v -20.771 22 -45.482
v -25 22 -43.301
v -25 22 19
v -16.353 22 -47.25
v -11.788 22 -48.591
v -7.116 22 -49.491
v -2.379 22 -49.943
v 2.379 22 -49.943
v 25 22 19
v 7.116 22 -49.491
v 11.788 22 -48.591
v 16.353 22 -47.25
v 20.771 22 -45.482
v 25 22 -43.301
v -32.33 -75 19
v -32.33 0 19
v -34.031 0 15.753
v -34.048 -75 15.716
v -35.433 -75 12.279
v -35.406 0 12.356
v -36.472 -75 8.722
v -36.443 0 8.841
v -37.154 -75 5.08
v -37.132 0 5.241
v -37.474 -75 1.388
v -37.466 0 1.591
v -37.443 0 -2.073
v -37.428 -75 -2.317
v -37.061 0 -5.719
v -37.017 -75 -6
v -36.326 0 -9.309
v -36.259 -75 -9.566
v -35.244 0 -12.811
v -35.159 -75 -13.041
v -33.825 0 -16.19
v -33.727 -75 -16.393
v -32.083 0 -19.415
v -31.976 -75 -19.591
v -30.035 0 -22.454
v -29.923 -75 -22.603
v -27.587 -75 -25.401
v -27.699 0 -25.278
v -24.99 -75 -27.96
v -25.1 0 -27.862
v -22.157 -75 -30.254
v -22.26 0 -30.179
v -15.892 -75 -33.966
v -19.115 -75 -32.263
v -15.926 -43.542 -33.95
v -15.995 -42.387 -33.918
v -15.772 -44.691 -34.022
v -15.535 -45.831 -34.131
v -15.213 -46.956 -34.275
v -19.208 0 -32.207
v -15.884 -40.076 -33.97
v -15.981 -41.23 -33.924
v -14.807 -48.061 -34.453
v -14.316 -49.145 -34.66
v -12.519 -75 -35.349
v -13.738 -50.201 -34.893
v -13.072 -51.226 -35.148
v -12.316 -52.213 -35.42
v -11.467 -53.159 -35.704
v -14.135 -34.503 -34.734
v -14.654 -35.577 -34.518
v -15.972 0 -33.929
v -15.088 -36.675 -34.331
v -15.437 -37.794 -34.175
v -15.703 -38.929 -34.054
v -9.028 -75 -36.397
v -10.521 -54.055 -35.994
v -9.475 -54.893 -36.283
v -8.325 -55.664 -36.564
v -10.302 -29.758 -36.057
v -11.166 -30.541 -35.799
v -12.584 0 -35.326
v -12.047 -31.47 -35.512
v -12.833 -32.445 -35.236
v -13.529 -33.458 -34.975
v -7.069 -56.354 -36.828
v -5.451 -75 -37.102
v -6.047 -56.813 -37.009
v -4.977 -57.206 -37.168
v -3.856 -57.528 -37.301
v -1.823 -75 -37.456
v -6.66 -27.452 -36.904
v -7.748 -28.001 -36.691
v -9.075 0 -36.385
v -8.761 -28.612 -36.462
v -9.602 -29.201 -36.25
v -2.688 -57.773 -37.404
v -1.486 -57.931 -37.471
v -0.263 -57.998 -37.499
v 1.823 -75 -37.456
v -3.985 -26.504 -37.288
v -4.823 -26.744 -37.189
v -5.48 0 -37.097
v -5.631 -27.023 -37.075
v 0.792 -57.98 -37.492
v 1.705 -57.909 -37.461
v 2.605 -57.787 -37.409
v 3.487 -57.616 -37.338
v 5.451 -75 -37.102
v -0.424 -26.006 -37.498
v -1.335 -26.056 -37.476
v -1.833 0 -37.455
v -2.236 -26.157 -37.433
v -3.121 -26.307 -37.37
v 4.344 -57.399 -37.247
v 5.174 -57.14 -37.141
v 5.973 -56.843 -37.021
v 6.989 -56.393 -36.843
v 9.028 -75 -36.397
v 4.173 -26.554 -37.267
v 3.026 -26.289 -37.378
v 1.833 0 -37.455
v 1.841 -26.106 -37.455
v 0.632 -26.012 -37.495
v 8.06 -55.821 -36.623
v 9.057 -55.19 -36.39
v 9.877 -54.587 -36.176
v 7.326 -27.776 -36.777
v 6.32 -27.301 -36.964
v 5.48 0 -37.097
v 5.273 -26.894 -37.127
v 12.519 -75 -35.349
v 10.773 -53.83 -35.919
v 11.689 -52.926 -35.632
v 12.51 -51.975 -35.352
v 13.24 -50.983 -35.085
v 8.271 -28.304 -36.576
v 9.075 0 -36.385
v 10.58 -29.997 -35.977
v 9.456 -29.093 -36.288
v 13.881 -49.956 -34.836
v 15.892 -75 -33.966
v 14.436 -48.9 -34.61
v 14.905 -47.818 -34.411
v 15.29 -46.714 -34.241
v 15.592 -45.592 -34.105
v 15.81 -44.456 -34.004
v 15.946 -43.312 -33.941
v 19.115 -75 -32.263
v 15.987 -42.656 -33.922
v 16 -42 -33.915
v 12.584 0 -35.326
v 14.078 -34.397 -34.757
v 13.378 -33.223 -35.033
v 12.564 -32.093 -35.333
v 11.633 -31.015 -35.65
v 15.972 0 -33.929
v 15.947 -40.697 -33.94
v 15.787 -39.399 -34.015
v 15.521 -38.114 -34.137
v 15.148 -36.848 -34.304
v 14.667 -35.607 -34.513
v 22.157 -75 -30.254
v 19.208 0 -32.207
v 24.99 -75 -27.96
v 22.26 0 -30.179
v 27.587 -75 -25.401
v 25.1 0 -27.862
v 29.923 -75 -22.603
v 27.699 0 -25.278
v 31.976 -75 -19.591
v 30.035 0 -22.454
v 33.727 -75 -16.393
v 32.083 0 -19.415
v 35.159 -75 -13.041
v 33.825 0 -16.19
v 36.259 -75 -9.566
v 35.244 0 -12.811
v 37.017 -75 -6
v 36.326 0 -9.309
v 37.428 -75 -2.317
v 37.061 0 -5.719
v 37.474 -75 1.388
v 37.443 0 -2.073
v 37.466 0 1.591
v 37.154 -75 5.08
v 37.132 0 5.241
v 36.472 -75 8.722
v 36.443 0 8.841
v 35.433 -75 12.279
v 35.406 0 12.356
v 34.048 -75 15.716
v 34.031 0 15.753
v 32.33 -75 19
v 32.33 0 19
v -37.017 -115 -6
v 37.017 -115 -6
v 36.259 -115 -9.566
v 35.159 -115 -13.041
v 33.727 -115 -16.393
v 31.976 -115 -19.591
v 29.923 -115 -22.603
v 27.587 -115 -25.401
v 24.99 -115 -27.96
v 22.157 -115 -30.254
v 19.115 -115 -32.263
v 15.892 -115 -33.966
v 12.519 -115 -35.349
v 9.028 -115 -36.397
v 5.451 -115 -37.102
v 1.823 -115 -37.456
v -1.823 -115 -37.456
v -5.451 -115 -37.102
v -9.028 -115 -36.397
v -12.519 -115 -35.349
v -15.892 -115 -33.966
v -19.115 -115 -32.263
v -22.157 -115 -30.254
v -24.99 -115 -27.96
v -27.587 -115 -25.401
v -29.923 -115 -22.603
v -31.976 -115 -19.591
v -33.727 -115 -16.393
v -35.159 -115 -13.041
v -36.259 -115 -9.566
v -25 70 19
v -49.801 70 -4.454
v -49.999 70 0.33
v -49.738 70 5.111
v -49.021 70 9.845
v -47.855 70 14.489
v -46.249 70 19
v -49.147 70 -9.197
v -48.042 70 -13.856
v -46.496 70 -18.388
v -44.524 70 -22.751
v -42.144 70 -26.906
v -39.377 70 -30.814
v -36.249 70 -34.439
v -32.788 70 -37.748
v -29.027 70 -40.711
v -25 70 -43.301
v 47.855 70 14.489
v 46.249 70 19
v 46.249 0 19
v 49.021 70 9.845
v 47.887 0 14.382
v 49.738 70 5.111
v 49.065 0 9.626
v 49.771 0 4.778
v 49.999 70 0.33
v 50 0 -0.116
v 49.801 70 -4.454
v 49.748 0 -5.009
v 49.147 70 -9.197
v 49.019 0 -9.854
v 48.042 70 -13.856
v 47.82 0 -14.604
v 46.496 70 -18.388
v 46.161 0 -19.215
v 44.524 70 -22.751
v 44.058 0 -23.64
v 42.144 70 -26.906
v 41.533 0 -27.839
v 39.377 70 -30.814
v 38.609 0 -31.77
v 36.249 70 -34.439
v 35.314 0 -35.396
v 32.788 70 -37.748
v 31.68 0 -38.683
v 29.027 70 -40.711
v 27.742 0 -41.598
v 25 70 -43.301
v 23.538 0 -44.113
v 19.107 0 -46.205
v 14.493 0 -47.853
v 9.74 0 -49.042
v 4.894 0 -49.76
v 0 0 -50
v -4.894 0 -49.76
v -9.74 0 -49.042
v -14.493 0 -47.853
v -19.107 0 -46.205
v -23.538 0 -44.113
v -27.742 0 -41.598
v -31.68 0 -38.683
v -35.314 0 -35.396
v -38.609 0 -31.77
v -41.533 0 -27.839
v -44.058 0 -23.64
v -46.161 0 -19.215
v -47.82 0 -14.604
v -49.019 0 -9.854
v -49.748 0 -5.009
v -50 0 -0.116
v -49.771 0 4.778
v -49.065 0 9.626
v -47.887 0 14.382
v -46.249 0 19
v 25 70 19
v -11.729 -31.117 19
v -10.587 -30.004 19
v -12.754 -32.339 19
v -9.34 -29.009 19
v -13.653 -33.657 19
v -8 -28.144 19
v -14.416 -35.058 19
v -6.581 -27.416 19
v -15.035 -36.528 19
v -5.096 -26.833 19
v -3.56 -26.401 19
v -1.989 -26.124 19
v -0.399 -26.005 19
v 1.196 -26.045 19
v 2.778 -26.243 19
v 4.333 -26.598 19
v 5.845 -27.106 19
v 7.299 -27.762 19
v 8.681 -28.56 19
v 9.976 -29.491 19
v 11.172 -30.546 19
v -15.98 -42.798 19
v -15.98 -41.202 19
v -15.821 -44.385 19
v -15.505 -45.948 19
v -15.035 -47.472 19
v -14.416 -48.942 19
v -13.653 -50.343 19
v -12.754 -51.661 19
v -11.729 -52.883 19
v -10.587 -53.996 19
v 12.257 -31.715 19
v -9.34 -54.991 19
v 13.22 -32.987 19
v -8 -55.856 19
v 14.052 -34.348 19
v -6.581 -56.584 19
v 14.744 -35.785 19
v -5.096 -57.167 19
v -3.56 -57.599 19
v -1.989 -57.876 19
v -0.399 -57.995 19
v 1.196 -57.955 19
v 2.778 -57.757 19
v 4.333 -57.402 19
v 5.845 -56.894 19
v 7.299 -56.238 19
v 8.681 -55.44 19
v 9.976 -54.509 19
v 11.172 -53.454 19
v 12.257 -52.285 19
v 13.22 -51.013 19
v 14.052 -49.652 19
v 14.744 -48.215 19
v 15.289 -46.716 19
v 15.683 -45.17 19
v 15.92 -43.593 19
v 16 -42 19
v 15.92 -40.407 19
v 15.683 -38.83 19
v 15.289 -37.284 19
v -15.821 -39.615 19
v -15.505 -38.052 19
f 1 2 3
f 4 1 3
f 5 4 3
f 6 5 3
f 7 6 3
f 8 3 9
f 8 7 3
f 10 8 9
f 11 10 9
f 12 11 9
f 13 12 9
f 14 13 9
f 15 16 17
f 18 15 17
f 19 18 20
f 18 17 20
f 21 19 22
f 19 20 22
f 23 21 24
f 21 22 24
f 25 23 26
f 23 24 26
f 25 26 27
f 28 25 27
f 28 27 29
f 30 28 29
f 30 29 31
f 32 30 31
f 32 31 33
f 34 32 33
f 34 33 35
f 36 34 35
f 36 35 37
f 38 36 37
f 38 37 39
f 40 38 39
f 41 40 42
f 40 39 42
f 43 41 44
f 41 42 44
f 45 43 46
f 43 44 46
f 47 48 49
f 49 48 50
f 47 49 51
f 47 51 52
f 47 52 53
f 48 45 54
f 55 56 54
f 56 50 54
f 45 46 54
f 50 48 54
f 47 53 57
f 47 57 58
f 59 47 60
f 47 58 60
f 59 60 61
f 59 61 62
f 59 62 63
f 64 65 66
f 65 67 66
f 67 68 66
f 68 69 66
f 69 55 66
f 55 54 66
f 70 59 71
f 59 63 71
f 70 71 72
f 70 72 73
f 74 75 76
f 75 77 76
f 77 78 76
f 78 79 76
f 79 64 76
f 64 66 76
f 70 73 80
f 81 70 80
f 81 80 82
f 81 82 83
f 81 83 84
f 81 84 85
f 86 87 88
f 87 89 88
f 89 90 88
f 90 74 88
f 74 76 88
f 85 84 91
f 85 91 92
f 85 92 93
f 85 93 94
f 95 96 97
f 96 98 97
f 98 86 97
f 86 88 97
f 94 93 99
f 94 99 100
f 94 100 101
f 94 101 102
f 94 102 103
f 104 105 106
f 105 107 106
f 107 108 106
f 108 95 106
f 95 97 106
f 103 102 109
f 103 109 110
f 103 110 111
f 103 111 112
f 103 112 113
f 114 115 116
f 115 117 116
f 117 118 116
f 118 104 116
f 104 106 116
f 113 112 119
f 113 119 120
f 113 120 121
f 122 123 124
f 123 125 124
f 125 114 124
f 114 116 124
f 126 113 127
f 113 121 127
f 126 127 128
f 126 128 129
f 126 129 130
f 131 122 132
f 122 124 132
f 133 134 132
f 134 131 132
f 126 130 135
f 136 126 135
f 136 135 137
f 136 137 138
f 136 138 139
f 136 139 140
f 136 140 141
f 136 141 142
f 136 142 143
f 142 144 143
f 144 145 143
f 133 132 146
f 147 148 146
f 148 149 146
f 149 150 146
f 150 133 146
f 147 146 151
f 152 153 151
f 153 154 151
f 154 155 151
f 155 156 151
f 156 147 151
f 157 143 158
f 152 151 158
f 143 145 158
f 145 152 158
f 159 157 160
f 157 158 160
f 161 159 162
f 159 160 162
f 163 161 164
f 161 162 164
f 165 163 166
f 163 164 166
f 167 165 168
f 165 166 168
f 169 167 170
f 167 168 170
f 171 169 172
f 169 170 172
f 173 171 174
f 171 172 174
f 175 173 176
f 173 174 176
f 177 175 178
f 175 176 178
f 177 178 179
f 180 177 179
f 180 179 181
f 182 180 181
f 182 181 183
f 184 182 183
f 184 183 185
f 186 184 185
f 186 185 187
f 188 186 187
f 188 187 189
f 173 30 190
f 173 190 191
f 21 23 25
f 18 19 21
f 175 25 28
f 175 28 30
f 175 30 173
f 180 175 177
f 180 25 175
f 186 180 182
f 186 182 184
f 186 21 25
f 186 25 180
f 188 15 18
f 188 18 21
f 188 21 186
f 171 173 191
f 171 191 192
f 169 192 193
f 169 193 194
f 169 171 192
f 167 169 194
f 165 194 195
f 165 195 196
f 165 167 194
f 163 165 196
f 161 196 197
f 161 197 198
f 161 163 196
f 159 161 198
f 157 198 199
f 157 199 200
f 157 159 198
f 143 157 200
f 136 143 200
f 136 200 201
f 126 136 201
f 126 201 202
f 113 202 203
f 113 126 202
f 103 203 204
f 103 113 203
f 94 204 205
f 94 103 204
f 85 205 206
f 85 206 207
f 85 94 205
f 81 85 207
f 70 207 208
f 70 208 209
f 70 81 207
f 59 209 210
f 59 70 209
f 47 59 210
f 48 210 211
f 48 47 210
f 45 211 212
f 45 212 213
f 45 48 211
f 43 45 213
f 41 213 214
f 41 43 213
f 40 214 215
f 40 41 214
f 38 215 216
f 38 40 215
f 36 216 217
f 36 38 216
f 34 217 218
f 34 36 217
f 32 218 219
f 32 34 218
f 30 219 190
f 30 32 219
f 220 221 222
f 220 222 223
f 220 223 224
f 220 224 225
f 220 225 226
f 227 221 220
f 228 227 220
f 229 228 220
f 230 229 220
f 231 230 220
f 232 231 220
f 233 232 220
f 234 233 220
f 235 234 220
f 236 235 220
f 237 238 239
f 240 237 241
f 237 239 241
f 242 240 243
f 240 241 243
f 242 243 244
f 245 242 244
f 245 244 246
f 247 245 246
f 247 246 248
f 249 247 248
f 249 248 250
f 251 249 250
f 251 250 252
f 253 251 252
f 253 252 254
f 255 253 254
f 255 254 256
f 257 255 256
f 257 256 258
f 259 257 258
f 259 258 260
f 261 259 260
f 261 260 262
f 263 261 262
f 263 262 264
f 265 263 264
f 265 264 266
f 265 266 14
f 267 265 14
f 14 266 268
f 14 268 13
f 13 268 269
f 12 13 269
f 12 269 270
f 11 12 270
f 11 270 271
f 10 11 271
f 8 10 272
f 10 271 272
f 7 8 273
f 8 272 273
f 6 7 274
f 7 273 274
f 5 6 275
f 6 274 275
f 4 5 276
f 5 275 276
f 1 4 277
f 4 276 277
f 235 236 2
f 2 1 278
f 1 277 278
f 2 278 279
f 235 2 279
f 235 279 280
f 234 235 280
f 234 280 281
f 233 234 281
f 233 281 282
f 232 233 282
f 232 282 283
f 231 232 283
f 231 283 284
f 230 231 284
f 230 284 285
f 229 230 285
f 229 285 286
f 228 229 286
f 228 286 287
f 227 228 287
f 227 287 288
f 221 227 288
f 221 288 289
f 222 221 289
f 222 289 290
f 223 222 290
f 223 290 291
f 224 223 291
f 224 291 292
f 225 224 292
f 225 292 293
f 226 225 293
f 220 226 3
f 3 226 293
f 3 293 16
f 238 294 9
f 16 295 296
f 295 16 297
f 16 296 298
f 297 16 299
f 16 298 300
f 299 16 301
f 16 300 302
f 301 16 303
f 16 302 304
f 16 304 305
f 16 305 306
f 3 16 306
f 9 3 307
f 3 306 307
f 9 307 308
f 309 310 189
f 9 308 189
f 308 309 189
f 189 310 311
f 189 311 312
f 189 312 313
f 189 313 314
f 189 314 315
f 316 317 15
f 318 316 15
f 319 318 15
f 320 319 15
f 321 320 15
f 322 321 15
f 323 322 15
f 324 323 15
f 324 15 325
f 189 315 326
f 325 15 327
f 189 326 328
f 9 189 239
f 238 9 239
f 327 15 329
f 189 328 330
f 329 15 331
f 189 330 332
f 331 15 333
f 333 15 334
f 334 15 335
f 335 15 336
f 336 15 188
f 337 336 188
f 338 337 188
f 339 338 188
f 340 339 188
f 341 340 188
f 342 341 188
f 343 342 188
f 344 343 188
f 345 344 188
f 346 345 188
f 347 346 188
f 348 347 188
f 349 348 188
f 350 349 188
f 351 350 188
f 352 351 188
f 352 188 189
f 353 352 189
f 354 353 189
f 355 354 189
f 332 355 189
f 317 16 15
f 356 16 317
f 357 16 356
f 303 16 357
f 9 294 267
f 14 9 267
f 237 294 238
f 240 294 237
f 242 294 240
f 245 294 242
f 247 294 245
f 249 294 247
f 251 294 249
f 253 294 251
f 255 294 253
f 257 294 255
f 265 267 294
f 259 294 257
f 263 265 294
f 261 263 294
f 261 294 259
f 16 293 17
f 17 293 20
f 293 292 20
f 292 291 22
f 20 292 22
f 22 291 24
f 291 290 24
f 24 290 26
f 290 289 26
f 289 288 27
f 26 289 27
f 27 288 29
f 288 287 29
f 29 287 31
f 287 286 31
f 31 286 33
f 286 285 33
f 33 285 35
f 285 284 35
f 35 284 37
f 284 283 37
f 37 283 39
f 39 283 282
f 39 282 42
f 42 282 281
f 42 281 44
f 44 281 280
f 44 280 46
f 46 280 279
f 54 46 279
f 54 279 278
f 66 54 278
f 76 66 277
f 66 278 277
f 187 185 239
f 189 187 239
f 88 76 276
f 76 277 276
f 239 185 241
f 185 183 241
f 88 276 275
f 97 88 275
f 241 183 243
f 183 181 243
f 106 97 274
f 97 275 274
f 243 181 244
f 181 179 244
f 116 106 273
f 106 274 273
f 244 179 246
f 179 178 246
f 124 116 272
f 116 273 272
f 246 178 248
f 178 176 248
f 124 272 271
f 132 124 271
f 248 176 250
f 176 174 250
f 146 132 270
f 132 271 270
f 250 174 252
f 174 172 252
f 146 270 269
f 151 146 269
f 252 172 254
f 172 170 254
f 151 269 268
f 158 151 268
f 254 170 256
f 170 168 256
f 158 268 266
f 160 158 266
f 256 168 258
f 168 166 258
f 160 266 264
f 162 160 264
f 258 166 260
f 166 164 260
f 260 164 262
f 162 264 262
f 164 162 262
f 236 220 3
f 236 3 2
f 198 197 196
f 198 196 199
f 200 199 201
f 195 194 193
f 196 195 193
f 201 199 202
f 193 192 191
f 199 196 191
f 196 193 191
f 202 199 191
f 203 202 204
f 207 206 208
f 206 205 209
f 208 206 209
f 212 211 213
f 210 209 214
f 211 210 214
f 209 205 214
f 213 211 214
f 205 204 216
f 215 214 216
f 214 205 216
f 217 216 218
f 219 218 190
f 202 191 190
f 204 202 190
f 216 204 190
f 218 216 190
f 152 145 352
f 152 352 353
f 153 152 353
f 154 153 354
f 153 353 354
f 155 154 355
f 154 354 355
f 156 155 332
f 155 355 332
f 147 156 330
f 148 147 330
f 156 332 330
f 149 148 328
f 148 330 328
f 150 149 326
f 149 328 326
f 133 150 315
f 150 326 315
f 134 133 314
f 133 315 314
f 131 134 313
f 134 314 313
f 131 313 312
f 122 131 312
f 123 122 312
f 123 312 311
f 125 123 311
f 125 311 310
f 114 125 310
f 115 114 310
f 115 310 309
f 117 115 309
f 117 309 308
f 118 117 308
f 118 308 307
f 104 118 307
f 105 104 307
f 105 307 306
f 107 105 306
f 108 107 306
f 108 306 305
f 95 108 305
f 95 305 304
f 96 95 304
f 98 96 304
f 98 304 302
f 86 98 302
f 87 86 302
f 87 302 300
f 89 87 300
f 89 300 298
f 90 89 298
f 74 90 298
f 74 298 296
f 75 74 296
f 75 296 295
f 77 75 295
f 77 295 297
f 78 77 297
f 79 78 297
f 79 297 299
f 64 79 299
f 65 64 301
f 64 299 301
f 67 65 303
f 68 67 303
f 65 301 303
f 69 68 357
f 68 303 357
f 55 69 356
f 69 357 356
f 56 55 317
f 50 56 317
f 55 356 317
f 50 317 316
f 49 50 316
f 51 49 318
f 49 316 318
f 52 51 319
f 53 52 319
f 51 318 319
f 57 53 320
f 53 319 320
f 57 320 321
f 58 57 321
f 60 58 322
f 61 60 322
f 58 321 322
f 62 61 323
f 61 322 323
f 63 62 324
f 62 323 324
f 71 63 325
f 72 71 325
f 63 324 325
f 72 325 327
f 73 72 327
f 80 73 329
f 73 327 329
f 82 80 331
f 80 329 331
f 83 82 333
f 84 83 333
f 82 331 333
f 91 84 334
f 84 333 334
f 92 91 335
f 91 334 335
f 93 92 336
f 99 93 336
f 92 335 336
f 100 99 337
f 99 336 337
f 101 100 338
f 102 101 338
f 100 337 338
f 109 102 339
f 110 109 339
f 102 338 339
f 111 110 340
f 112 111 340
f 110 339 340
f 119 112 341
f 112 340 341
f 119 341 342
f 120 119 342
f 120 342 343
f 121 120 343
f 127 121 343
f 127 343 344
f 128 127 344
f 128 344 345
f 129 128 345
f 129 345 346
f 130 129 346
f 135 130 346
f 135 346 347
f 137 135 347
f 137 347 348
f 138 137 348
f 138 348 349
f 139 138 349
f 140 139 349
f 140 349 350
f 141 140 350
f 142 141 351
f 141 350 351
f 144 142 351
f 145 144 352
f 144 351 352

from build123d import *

# Parameters (mm, degrees)
BOSS_EXTRUDE1_DEPTH = 70
SKETCH2_W           = 50
SKETCH2_H           = 74.667138355
CUT_EXTRUDE1_DEPTH  = 48
BOSS_EXTRUDE2_DEPTH = 75
BOSS_EXTRUDE3_DEPTH = 40
SKETCH5_R           = 16
CUT_EXTRUDE2_DEPTH  = 70


with BuildPart() as part:
    # Sketch1 → Boss-Extrude1 (new body)
    with BuildSketch(Plane(origin=(0, 0, 0), x_dir=(1, 0, 0), z_dir=(0, 1, 0))):
        with BuildLine():
            Line((-46.249324319, -19), (46.249324319, -19))
            ThreePointArc((46.249324319, -19), (0, 50), (-46.249324319, -19))
        make_face()
    extrude(amount=BOSS_EXTRUDE1_DEPTH)

    # Sketch2 → Cut-Extrude1 (cut)
    with BuildSketch(Plane(origin=(0, 70, 0), x_dir=(1, 0, 0), z_dir=(0, 1, 0))):
        with Locations((0, 18.333569178)):
            Rectangle(SKETCH2_W, SKETCH2_H)
    extrude(amount=-CUT_EXTRUDE1_DEPTH, mode=Mode.SUBTRACT)

    # Sketch3 → Boss-Extrude2 (add)
    with BuildSketch(Plane.XZ):
        with BuildLine():
            Line((32.330326321, 19), (-32.330326321, 19))
            ThreePointArc((-32.330326321, 19), (0, -37.5), (32.330326321, 19))
        make_face()
    extrude(amount=BOSS_EXTRUDE2_DEPTH)

    # Sketch4 → Boss-Extrude3 (add)
    with BuildSketch(Plane.XZ.offset(75)):
        with BuildLine():
            Line((-37.016888038, -6), (37.016888038, -6))
            ThreePointArc((37.016888038, -6), (0, -37.5), (-37.016888038, -6))
        make_face()
    extrude(amount=BOSS_EXTRUDE3_DEPTH)

    # Sketch5 → Cut-Extrude2 (cut, through all)
    with BuildSketch(Plane.XY.offset(19)):
        with Locations((0, -42)):
            Circle(SKETCH5_R)
    extrude(amount=-CUT_EXTRUDE2_DEPTH, mode=Mode.SUBTRACT)


solid = part.part
